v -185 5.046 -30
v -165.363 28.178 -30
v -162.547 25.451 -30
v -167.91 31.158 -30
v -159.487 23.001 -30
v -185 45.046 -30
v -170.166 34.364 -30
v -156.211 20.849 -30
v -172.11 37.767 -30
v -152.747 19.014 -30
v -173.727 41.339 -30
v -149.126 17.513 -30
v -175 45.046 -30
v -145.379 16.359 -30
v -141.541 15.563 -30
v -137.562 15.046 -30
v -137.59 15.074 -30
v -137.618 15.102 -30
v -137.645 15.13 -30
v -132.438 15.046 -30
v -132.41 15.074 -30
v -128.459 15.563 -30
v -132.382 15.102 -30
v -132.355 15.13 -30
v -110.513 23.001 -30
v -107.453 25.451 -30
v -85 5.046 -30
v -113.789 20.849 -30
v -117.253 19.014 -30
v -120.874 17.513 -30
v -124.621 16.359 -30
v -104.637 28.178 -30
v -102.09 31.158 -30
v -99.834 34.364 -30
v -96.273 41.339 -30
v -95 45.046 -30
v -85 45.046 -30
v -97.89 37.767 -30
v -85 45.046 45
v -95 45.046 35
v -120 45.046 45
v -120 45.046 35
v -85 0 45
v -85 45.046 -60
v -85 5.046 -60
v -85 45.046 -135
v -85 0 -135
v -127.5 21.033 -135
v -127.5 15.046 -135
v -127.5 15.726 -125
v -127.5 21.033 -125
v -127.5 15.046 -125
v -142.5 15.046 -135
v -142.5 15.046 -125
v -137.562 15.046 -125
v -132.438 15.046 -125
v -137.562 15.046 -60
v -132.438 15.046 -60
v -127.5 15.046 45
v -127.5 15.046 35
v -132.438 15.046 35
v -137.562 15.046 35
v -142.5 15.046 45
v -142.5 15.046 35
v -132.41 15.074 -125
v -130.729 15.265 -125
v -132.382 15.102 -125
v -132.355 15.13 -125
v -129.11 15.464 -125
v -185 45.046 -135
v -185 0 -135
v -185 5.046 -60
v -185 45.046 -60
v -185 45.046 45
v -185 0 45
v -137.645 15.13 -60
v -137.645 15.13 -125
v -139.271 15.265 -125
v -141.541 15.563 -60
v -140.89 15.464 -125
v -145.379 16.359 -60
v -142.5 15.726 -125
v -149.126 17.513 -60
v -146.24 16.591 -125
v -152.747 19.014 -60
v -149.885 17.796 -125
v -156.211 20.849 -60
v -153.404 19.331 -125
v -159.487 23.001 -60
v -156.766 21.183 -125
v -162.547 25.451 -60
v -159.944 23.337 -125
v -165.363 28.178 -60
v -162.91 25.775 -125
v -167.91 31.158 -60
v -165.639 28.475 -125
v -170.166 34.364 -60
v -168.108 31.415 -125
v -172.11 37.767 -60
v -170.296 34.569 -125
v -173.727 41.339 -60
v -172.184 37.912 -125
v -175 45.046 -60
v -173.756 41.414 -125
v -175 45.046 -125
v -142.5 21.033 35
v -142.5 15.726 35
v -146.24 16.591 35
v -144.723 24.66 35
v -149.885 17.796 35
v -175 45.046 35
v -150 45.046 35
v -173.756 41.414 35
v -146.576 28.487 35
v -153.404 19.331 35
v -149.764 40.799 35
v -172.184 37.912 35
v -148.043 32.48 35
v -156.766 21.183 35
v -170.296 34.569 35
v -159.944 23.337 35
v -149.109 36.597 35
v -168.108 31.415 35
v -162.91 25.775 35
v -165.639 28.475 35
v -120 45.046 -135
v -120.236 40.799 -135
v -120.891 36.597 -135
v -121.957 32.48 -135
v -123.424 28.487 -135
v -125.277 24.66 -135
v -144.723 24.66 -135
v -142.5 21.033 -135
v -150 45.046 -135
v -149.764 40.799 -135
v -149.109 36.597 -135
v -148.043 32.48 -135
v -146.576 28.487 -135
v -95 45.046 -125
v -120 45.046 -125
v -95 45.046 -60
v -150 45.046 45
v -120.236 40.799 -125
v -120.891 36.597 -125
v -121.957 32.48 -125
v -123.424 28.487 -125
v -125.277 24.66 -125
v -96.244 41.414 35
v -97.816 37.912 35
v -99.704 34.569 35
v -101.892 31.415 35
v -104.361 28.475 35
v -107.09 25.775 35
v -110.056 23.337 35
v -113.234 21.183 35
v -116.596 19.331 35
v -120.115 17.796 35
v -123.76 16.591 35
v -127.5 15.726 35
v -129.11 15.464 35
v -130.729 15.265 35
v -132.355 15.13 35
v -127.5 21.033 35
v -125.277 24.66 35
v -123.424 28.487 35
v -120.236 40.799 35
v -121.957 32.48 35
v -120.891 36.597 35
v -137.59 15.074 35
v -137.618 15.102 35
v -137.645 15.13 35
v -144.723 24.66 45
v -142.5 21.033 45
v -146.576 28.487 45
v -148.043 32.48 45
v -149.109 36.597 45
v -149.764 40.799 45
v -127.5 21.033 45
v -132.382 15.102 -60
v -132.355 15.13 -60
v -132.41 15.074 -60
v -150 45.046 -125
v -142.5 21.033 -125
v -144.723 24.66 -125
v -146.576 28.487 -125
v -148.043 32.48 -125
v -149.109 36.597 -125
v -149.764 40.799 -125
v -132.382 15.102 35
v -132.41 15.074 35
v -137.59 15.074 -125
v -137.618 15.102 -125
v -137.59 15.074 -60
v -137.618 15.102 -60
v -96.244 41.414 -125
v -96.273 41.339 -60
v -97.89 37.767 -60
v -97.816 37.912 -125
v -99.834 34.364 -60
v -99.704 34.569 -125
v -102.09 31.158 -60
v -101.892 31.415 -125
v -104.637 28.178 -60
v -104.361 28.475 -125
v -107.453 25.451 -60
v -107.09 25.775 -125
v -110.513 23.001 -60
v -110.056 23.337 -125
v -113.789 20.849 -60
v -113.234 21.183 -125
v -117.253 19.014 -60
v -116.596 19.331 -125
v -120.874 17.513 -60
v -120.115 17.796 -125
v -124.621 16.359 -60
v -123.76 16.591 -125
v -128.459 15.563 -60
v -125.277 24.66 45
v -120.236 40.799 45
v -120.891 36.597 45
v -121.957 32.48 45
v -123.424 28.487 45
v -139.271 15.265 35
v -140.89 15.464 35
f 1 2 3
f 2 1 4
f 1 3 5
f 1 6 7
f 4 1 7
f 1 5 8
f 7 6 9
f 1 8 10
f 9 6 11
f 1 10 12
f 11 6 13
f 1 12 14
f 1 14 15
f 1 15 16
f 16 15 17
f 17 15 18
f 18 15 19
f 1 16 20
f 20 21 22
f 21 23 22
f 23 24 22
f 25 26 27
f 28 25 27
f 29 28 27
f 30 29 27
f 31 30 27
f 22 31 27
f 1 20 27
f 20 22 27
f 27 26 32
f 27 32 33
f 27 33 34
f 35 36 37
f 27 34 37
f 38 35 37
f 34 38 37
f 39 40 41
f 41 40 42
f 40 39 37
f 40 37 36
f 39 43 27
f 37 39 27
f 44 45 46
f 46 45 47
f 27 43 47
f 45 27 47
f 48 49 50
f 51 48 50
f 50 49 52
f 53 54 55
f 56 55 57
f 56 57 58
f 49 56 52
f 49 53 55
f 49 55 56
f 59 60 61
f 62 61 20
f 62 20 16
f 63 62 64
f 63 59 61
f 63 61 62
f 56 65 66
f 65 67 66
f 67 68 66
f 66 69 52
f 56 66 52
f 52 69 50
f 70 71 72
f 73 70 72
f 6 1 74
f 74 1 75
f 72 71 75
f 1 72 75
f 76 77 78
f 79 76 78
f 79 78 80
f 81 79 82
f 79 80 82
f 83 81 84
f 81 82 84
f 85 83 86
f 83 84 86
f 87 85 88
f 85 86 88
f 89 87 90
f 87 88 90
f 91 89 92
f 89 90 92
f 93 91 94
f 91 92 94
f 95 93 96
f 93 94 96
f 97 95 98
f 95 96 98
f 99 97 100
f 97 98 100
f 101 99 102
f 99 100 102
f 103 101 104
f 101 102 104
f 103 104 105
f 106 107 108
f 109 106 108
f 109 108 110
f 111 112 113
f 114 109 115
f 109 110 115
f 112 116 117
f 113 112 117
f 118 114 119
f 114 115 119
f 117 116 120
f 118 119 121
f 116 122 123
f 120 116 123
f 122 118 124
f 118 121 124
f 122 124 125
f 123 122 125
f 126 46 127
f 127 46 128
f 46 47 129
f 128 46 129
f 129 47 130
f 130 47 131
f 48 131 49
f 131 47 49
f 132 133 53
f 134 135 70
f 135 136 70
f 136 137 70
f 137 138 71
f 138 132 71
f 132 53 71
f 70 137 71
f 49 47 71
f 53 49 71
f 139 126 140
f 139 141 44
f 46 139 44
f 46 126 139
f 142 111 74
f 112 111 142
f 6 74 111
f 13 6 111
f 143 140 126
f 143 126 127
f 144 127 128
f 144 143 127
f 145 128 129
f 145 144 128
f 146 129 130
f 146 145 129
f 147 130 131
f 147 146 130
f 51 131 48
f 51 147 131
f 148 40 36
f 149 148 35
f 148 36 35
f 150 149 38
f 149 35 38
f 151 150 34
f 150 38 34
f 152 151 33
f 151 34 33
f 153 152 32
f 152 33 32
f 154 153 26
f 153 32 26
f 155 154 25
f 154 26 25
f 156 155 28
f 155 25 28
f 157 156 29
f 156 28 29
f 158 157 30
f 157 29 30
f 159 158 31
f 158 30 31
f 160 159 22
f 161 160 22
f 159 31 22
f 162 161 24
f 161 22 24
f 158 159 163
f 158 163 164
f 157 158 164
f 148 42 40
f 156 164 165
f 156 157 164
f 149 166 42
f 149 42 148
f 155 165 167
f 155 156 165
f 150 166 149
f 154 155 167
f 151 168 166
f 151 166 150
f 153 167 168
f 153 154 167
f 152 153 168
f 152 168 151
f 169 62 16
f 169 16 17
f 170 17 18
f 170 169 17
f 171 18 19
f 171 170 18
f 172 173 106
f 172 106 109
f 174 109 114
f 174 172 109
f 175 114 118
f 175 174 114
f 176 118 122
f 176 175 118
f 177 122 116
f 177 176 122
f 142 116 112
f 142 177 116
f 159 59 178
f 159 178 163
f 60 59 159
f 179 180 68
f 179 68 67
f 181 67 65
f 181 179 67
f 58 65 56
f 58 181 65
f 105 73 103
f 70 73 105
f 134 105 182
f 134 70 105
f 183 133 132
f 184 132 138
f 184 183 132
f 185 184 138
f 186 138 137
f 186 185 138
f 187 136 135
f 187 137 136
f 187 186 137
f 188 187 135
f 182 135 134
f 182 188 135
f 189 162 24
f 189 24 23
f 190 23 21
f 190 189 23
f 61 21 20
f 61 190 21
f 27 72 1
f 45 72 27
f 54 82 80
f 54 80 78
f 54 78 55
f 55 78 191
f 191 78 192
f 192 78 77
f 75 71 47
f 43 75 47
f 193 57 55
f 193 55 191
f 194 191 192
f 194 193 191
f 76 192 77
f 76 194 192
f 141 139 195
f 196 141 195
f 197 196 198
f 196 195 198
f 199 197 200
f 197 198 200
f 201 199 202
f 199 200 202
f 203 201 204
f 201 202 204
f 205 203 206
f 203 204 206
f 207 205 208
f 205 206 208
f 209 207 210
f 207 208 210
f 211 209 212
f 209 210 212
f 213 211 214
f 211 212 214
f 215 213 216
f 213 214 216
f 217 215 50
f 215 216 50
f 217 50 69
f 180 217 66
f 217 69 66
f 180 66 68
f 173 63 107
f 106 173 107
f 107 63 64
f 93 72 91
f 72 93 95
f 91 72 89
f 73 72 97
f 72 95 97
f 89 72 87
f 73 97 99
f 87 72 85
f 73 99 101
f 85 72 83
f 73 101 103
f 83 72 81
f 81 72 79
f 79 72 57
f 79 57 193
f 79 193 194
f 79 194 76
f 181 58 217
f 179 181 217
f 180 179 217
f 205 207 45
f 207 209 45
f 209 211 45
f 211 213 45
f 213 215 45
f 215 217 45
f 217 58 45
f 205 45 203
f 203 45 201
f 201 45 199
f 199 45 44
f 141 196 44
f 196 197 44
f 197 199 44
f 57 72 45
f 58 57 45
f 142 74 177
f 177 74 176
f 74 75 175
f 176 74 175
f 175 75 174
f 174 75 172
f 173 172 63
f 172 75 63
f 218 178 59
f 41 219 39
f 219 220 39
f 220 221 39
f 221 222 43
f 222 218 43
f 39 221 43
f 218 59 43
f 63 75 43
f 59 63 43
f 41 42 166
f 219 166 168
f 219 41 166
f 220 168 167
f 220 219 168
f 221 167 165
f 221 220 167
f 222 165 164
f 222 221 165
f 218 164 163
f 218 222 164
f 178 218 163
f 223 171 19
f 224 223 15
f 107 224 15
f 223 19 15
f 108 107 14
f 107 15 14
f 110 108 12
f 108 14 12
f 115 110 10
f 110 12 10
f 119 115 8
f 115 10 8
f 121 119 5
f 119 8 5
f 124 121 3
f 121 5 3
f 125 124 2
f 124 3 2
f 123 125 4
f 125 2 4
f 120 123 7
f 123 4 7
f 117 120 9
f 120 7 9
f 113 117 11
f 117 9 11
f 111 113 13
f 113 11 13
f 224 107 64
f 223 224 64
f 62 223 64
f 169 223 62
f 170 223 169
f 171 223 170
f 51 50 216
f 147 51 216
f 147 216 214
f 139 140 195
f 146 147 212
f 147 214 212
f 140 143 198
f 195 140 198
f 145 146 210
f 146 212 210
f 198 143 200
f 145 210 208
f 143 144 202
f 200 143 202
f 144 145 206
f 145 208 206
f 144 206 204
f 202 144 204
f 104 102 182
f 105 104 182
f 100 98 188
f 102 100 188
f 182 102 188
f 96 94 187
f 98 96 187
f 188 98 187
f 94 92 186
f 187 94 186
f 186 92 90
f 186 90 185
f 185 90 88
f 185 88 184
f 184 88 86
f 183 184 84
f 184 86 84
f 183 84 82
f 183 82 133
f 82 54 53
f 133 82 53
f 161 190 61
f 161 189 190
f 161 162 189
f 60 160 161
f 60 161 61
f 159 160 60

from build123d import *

# Parameters (mm, degrees)
BOSS_EXTRUDE1_DEPTH     = 15.045877519
BOSS_EXTRUDE2_DEPTH     = 30
BOSS_EXTRUDE3_DEPTH     = 160
CUT_EXTRUDE1_DEPTH      = 397.42670329
CUT_EXTRUDE1_DEPTH_BACK = 397.42670329
SKETCH5_W               = 30
SKETCH5_H               = 30
CUT_EXTRUDE2_START      = -30
CUT_EXTRUDE2_DEPTH      = 30
CUT_EXTRUDE3_DEPTH      = 10
CUT_EXTRUDE4_DEPTH      = 263.019333412


# Read off the part's stored shape, not the designer's step: Boss-Extrude3
with BuildPart() as part:
    # Sketch1 → Boss-Extrude1 (new body)
    with BuildSketch(Plane(origin=(0, 0, 0), x_dir=(1, 0, 0), z_dir=(0, 1, 0))):
        with BuildLine():
            Line((-185, -65), (5, -65))
            ThreePointArc((5, -65), (60.514401442, -84.704810384), (91.182336182, -135))
            Line((91.182336182, -135), (185, -135))
            Line((185, -135), (185, 135))
            Line((185, 135), (-185, 135))
            Line((-185, 135), (-185, -65))
        make_face()
    extrude(amount=BOSS_EXTRUDE1_DEPTH)

    # Sketch2 → Boss-Extrude2 (add)
    with BuildSketch(Plane(origin=(0, 15.045877519, 0), x_dir=(1, 0, 0), z_dir=(0, 1, 0))):
        Polygon((-175, -35), (-175, 30), (-185, 30), (-185, -45), (-142.5, -45), (-142.5, -35), align=None)
        Polygon((-175, 125), (-142.5, 125), (-142.5, 135), (-185, 135), (-185, 60), (-175, 60), align=None)
        Polygon((-95, -35), (-95, 30), (-85, 30), (-85, -45), (-127.5, -45), (-127.5, -35), align=None)
        Polygon((-127.5, 135), (-127.5, 125), (-95, 125), (-95, 60), (-85, 60), (-85, 135), align=None)
    extrude(amount=BOSS_EXTRUDE2_DEPTH)

    # Boss-Extrude3 outline → Boss-Extrude3 (add)
    with BuildSketch(Plane.XY.offset(-125)):
        with BuildLine():
            ThreePointArc((-95, 45.045877519), (-110, 23.379210852), (-135, 15.045877519))
            Line((-135, 15.045877519), (-95, 15.045877519))
            Line((-95, 15.045877519), (-95, 45.045877519))
        make_face()
        with BuildLine():
            Line((-175, 45.045877519), (-175, 15.045877519))
            Line((-175, 15.045877519), (-135, 15.045877519))
            ThreePointArc((-135, 15.045877519), (-160, 23.379210852), (-175, 45.045877519))
        make_face()
    extrude(amount=BOSS_EXTRUDE3_DEPTH)

    # Sketch5 → Cut-Extrude1 (cut, two sides: drawn at the far end of the back side and taken through both)
    with BuildSketch(Plane.ZY.offset(185).offset(-CUT_EXTRUDE1_DEPTH_BACK)):
        with Locations((-45, 30.045877519)):
            Rectangle(SKETCH5_W, SKETCH5_H)
    extrude(amount=CUT_EXTRUDE1_DEPTH + CUT_EXTRUDE1_DEPTH_BACK, mode=Mode.SUBTRACT)

    # Sketch6 → Cut-Extrude2 (cut)
    with BuildSketch(Plane(origin=(0, 15.045877519, 0), x_dir=(1, 0, 0), z_dir=(0, 1, 0)).offset(CUT_EXTRUDE2_START)):
        with BuildLine():
            Line((-142.5, -45), (-127.5, -45))
            Line((-127.5, -45), (-85, -45))
            Line((-85, -45), (-85, 30))
            Line((-85, 30), (-85, 60))
            Line((-85, 60), (-85, 135))
            Line((-85, 135), (185, 135))
            Line((185, 135), (185, -135))
            Line((185, -135), (91.182336182, -135))
            ThreePointArc((91.182336182, -135), (60.514401442, -84.704810384), (5, -65))
            Line((5, -65), (-185, -65))
            Line((-185, -65), (-185, -45))
            Line((-185, -45), (-142.5, -45))
        make_face()
    extrude(amount=CUT_EXTRUDE2_DEPTH, mode=Mode.SUBTRACT)

    # Sketch8 → Cut-Extrude3 (cut)
    with BuildSketch(Plane(origin=(0, 15.045877519, 0), x_dir=(1, 0, 0), z_dir=(0, 1, 0))):
        Polygon((-135, 30), (-85, 30), (-85, 60), (-135, 60), (-185, 60), (-185, 30), align=None)
    extrude(amount=-CUT_EXTRUDE3_DEPTH, mode=Mode.SUBTRACT)

    # Sketch9 → Cut-Extrude4 (cut, through all)
    with BuildSketch(Plane.XY.offset(45)):
        with BuildLine():
            Line((-150, 45.045877519), (-120, 45.045877519))
            ThreePointArc((-120, 45.045877519), (-123.28072965, 28.827812568), (-132.437534993, 15.045877519))
            Line((-132.437534993, 15.045877519), (-137.562465007, 15.045877519))
            ThreePointArc((-137.562465007, 15.045877519), (-146.71927035, 28.827812568), (-150, 45.045877519))
        make_face()
    extrude(amount=-CUT_EXTRUDE4_DEPTH, mode=Mode.SUBTRACT)


solid = part.part
